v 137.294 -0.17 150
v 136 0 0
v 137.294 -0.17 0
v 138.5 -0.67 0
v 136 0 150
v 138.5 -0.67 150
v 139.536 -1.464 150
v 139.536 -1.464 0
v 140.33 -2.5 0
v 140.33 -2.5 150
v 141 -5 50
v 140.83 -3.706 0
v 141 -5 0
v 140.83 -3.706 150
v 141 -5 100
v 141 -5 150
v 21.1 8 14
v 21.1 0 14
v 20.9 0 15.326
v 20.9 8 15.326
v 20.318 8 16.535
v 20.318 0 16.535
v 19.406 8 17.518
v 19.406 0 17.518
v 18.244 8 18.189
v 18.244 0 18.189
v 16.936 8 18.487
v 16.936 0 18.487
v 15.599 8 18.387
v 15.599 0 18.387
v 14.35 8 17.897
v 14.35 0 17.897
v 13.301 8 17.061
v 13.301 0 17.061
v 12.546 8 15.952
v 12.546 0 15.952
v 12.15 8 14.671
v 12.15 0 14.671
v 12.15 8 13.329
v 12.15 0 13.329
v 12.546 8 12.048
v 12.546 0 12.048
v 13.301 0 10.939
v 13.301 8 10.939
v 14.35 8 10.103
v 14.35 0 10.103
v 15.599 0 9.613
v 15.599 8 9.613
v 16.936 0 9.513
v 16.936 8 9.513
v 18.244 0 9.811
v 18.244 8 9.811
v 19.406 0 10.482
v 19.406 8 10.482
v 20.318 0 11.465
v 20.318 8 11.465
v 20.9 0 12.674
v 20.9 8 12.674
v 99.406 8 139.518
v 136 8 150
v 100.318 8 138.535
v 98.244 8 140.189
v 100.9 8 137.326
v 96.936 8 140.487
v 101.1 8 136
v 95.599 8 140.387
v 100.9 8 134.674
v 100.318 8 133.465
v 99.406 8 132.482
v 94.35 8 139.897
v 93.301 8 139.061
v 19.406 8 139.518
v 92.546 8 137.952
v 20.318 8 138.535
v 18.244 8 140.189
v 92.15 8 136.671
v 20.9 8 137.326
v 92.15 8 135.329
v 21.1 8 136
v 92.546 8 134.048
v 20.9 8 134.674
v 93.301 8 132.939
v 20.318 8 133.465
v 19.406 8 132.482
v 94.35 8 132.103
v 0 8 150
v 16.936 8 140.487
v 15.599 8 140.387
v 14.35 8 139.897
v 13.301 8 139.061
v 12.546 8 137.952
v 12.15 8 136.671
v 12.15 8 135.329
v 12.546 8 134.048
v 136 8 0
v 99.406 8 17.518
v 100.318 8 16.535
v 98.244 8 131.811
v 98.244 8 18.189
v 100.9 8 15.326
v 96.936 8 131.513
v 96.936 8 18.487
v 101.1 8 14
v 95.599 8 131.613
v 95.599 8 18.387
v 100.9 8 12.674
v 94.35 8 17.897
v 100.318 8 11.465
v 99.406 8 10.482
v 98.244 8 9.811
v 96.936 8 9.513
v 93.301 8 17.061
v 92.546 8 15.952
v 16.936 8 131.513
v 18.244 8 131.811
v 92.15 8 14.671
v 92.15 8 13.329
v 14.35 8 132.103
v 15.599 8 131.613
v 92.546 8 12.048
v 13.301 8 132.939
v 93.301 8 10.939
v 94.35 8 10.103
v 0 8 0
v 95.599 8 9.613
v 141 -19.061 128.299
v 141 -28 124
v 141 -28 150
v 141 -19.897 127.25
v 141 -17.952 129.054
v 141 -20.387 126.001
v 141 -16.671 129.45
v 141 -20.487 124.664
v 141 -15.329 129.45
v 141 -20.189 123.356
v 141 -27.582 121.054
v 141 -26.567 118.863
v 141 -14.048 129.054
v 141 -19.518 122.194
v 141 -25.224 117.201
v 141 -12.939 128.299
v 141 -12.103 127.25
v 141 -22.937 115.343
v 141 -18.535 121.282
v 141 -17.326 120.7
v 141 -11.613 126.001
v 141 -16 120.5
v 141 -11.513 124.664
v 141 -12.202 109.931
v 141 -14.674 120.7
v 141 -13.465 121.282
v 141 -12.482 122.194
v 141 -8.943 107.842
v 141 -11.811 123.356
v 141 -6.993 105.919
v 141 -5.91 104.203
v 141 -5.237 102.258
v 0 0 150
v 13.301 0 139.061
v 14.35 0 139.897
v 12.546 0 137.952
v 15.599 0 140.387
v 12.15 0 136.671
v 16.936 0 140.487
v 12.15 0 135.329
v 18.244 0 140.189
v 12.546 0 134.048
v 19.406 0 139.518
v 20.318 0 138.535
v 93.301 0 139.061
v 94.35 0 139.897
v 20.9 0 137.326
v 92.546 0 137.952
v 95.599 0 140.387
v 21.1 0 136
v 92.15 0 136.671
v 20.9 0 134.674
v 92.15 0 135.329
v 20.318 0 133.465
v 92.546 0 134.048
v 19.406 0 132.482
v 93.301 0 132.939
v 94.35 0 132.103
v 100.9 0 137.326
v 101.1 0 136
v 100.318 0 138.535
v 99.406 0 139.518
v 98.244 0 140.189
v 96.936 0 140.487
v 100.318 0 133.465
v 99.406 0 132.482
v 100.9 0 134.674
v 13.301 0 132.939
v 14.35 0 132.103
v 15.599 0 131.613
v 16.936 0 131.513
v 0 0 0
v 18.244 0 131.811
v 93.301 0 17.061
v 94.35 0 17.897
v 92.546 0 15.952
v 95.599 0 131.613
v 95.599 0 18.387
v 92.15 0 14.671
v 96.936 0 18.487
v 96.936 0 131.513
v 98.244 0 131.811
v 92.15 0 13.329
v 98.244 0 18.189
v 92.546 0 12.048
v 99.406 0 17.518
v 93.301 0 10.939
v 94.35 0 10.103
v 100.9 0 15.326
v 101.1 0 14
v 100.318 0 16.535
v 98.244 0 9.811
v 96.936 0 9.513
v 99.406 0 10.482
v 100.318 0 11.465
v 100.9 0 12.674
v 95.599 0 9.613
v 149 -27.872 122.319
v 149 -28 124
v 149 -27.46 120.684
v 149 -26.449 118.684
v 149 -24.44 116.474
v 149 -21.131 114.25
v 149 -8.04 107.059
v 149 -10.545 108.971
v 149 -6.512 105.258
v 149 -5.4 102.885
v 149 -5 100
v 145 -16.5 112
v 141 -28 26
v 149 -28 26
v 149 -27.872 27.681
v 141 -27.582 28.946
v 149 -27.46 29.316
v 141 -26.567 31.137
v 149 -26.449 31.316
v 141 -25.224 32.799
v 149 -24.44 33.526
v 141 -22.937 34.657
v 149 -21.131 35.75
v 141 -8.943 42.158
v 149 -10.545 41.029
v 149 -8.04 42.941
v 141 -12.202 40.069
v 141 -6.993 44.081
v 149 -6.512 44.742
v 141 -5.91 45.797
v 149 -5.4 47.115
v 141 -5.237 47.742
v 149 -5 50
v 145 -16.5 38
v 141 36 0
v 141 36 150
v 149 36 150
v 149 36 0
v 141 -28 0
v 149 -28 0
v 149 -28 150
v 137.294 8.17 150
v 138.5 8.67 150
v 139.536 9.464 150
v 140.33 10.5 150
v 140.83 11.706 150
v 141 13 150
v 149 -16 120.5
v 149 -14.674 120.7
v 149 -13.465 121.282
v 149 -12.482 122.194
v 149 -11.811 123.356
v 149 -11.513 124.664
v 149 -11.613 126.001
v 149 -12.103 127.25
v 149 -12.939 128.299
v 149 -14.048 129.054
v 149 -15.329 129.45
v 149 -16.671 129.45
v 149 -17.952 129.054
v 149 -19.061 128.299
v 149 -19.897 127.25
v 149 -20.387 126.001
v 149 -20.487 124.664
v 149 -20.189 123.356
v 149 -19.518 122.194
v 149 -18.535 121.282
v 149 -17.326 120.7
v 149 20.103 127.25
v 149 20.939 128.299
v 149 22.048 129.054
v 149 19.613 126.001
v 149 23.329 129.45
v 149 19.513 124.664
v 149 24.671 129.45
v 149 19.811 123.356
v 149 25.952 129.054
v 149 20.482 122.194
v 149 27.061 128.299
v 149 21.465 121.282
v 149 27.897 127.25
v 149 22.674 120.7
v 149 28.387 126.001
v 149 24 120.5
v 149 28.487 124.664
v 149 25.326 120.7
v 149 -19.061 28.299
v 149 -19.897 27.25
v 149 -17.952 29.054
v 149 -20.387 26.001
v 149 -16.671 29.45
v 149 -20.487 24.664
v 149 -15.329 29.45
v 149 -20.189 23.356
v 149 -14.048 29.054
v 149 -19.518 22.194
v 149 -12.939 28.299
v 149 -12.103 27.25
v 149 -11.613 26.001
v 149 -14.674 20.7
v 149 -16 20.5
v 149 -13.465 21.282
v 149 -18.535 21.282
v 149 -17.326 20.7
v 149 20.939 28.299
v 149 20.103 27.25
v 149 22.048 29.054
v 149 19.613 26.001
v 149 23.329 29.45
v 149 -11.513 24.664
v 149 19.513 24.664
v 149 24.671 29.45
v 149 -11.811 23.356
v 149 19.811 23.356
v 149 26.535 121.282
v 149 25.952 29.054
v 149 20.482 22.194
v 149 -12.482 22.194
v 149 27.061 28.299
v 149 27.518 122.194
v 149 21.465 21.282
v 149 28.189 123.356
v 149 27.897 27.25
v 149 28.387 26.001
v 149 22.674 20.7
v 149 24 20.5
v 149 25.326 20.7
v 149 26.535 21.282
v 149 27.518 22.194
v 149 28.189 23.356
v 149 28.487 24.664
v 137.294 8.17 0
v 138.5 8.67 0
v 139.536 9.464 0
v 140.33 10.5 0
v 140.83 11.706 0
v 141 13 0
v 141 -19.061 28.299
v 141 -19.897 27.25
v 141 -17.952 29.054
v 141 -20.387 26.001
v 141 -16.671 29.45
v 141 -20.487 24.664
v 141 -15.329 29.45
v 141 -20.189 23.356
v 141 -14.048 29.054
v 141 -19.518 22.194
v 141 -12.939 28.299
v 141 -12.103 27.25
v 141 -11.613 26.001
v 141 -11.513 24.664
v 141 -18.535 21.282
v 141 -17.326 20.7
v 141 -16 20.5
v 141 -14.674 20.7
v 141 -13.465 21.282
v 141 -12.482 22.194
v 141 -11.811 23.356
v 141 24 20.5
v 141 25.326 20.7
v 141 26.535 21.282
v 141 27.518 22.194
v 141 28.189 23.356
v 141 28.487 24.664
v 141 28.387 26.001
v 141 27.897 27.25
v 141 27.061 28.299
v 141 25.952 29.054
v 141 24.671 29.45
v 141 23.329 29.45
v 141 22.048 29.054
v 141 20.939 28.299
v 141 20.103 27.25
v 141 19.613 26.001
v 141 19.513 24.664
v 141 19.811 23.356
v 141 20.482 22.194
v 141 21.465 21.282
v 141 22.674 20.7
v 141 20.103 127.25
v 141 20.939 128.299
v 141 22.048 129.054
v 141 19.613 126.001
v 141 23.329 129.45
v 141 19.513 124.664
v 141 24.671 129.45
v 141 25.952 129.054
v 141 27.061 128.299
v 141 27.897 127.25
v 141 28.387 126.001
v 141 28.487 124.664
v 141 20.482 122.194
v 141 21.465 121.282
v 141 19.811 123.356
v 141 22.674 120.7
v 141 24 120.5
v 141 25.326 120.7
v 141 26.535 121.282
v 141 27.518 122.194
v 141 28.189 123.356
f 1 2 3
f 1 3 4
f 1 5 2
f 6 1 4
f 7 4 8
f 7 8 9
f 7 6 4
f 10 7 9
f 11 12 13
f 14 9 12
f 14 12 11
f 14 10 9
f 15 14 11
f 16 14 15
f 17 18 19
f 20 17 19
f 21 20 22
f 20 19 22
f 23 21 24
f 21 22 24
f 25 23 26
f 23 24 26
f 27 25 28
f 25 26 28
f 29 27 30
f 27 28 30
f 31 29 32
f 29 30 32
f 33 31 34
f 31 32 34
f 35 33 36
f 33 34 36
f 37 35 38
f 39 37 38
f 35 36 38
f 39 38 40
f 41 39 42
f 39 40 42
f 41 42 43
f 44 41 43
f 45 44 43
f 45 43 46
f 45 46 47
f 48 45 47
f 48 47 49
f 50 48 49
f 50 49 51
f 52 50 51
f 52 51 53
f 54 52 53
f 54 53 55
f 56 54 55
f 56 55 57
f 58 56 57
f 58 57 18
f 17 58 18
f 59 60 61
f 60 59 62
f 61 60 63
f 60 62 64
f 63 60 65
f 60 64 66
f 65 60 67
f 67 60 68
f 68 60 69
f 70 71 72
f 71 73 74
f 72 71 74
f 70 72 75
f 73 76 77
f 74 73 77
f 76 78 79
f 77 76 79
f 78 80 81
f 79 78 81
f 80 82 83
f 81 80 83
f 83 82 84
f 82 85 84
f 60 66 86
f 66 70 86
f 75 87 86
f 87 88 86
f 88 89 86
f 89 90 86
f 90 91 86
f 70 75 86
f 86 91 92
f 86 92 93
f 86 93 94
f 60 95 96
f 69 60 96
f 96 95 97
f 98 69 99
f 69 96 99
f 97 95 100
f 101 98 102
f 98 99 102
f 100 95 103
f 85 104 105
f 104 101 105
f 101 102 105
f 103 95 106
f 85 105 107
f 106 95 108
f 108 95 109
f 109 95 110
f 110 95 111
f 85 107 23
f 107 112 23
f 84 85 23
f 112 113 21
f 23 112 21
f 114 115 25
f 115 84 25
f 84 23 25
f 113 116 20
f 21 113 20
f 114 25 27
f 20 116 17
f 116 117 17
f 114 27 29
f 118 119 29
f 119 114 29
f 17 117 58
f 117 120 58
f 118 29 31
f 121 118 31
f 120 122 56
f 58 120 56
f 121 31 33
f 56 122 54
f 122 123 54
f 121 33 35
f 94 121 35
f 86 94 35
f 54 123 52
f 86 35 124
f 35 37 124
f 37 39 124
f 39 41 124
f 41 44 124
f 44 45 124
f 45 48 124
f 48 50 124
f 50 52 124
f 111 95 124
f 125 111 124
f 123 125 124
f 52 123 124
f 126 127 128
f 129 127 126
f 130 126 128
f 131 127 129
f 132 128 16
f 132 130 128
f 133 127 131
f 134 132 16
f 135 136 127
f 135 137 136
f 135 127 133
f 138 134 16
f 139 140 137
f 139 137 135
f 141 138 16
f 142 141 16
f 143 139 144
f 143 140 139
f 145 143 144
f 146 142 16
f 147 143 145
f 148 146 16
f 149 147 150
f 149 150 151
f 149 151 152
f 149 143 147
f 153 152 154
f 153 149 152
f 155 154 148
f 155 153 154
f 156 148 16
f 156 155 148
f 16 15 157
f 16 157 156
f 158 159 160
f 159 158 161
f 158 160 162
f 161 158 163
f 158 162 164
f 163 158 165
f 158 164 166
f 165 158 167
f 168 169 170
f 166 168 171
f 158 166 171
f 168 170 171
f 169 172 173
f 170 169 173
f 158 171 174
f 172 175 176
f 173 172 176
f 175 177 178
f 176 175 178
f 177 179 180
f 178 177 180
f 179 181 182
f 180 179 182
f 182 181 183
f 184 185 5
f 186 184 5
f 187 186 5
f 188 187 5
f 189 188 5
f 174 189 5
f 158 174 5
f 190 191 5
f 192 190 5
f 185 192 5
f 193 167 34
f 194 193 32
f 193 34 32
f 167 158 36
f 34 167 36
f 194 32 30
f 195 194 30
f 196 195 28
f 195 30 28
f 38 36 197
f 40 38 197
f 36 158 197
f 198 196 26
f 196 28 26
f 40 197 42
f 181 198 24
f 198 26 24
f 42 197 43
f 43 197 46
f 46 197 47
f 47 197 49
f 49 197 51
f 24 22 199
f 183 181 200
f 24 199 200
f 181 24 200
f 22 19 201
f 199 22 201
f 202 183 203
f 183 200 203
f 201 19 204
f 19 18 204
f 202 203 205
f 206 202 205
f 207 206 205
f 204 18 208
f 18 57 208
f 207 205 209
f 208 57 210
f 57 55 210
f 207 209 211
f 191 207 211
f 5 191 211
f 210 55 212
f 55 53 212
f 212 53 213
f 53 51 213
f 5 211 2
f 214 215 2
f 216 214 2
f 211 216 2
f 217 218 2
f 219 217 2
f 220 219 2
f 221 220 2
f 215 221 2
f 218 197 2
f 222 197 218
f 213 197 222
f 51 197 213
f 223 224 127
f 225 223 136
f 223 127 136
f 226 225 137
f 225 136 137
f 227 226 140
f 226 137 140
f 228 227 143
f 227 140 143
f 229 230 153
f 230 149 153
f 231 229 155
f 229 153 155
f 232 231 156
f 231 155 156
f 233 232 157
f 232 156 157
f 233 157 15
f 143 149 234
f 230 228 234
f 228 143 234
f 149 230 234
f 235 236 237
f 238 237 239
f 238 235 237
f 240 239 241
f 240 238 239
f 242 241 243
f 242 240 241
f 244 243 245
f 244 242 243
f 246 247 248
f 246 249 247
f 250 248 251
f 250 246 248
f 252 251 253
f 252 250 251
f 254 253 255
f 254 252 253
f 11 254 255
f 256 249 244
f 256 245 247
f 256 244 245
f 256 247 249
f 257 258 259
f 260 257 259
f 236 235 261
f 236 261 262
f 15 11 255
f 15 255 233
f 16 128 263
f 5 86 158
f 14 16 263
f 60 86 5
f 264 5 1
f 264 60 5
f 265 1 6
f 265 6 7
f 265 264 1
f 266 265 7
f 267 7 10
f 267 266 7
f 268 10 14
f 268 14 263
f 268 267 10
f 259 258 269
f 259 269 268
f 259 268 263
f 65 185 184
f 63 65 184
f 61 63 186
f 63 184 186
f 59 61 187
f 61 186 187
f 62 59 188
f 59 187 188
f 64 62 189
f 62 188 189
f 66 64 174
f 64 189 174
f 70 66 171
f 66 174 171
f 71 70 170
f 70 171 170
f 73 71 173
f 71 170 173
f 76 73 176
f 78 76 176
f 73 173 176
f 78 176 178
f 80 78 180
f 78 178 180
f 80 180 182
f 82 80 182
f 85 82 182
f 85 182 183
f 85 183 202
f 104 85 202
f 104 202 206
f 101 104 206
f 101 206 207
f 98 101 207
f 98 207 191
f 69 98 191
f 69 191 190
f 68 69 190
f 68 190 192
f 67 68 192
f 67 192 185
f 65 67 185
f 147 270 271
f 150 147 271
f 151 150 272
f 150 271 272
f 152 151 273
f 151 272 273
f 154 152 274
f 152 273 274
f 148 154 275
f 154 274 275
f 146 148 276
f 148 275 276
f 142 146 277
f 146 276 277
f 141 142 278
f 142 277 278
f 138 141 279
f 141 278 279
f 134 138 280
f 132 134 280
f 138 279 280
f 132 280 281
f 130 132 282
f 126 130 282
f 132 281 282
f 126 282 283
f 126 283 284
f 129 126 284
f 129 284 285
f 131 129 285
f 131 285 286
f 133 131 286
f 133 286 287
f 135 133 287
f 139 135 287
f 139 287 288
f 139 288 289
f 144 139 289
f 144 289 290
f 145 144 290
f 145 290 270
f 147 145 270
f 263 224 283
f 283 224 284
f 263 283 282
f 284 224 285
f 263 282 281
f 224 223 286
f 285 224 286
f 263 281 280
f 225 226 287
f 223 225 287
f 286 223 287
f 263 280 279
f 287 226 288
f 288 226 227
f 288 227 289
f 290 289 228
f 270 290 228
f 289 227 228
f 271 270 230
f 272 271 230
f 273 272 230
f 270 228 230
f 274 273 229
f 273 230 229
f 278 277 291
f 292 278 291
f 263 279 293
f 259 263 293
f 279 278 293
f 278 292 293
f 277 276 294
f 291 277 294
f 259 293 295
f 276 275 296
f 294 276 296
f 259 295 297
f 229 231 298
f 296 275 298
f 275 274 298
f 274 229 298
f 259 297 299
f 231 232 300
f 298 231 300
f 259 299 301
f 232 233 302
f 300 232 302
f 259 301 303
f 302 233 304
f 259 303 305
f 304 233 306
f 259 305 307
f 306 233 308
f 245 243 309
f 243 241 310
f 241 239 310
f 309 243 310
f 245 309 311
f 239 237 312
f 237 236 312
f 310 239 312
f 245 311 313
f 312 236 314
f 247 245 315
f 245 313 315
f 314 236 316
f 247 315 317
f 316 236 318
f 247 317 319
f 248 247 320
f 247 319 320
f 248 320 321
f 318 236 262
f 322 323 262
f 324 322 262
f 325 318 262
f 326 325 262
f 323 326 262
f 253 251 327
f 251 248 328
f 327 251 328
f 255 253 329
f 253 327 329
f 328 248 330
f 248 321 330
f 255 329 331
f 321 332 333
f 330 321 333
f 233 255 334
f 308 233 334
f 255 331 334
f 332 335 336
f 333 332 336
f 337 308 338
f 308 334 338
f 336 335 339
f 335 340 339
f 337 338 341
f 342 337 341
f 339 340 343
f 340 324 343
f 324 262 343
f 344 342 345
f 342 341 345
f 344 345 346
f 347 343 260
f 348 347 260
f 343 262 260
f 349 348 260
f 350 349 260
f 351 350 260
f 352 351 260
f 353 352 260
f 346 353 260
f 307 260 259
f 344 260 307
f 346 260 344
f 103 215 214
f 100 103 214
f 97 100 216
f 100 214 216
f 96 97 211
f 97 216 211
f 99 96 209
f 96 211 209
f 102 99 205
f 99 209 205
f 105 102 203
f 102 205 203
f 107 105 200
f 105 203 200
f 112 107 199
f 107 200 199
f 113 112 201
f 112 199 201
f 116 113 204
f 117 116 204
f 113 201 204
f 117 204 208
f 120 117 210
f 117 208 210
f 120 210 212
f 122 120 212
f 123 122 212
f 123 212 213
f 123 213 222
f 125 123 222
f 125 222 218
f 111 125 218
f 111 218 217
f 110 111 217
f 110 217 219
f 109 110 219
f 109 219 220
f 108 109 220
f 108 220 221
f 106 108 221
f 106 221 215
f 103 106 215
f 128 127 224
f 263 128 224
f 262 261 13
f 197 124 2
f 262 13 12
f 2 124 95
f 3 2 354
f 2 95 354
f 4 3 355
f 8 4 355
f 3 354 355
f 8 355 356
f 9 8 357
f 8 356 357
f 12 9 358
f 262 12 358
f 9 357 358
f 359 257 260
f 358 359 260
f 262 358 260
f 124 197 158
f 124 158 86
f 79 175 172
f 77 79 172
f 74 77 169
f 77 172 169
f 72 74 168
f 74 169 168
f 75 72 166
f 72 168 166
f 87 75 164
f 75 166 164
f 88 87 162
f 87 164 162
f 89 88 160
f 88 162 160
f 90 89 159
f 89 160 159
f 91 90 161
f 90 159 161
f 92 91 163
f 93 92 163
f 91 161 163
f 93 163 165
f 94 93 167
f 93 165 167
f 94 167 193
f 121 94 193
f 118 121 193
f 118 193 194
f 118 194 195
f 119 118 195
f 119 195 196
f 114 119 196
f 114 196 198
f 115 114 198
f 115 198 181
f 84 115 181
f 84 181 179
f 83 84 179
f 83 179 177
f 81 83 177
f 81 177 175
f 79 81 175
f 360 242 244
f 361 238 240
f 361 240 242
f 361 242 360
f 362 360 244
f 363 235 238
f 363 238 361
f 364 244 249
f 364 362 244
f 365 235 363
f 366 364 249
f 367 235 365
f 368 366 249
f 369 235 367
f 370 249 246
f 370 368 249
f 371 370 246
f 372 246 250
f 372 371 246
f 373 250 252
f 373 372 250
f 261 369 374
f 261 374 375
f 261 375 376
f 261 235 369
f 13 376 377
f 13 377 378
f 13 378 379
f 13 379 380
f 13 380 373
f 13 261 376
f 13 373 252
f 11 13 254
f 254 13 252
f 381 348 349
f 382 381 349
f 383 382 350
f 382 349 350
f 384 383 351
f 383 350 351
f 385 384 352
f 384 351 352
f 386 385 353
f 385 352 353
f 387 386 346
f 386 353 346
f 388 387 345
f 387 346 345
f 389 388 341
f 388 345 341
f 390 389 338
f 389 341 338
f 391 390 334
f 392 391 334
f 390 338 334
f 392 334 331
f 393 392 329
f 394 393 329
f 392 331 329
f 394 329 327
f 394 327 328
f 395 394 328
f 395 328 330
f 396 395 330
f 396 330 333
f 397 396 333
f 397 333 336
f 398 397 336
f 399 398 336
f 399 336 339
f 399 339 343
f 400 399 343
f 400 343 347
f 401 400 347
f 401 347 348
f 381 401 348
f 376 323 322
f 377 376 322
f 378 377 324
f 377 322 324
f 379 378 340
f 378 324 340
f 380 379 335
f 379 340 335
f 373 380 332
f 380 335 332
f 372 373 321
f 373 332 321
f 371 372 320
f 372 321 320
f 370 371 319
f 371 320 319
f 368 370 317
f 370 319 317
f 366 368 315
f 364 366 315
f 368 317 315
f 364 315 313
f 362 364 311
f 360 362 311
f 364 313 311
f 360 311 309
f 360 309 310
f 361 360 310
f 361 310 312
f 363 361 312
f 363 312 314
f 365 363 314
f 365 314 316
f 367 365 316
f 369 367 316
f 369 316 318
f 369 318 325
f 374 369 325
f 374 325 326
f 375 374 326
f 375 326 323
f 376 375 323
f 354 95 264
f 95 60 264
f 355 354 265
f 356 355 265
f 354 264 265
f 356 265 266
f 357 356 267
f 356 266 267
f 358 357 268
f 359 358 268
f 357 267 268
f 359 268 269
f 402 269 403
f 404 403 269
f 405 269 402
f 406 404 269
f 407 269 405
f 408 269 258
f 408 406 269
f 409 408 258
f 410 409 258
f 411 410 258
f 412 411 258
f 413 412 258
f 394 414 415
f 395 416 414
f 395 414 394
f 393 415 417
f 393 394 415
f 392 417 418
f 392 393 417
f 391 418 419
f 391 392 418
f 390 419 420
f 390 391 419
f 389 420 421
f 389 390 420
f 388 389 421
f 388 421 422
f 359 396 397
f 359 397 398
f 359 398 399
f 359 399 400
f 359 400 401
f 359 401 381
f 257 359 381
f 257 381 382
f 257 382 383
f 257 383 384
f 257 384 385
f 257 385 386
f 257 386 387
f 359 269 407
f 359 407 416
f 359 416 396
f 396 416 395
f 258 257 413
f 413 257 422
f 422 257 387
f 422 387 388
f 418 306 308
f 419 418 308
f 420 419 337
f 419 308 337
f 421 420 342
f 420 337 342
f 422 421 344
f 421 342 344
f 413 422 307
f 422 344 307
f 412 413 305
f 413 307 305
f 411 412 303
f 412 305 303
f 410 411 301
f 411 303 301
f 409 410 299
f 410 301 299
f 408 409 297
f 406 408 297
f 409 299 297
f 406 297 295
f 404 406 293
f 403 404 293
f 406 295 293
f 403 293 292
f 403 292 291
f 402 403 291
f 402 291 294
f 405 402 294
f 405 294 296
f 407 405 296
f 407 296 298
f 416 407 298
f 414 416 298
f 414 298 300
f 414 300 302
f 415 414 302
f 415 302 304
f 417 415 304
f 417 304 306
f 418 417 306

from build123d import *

# Parameters (mm, degrees)
SKETCH2_W           = 141
SKETCH2_H           = 8
SKETCH2_W_2         = 8
SKETCH2_H_2         = 28
BOSS_EXTRUDE1_DEPTH = 150
CUT_EXTRUDE1_REACH  = 38
SKETCH3_R           = 4.5
CUT_EXTRUDE2_REACH  = 151
SKETCH5_R           = 4.5
FILLET1_R           = 5
CUT_EXTRUDE3_REACH  = 10


with BuildPart() as part:
    # Sketch2 → Boss-Extrude1 (new body)
    with BuildSketch(Plane.XY):
        with Locations((70.5, 4)):
            Rectangle(SKETCH2_W, SKETCH2_H)
        with Locations((145, 4)):
            Rectangle(SKETCH2_W_2, SKETCH2_H)
        with Locations((145, 22)):
            Rectangle(SKETCH2_W_2, SKETCH2_H_2)
        with Locations((145, -14)):
            Rectangle(SKETCH2_W_2, SKETCH2_H_2)
    extrude(amount=BOSS_EXTRUDE1_DEPTH)

    # Sketch3 → Cut-Extrude1 (cut, up to next)
    with BuildSketch(Plane.XZ, mode=Mode.PRIVATE) as cut_extrude1_sk1:
        with Locations((96.6, 136)):
            Circle(SKETCH3_R)
    cut_extrude1_tool1 = extrude(cut_extrude1_sk1.sketch, amount=-CUT_EXTRUDE1_REACH, mode=Mode.PRIVATE) & part.part
    add(cut_extrude1_tool1.solids().sort_by_distance((96.6, 0, 136))[0], mode=Mode.SUBTRACT)
    # Sketch3 → Cut-Extrude1 (cut, up to next)
    with BuildSketch(Plane.XZ, mode=Mode.PRIVATE) as cut_extrude1_sk2:
        with Locations((16.6, 136)):
            Circle(SKETCH3_R)
    cut_extrude1_tool2 = extrude(cut_extrude1_sk2.sketch, amount=-CUT_EXTRUDE1_REACH, mode=Mode.PRIVATE) & part.part
    add(cut_extrude1_tool2.solids().sort_by_distance((16.6, 0, 136))[0], mode=Mode.SUBTRACT)
    # Sketch3 → Cut-Extrude1 (cut, up to next)
    with BuildSketch(Plane.XZ, mode=Mode.PRIVATE) as cut_extrude1_sk3:
        with Locations((16.6, 14)):
            Circle(SKETCH3_R)
    cut_extrude1_tool3 = extrude(cut_extrude1_sk3.sketch, amount=-CUT_EXTRUDE1_REACH, mode=Mode.PRIVATE) & part.part
    add(cut_extrude1_tool3.solids().sort_by_distance((16.6, 0, 14))[0], mode=Mode.SUBTRACT)
    # Sketch3 → Cut-Extrude1 (cut, up to next)
    with BuildSketch(Plane.XZ, mode=Mode.PRIVATE) as cut_extrude1_sk4:
        with Locations((96.6, 14)):
            Circle(SKETCH3_R)
    cut_extrude1_tool4 = extrude(cut_extrude1_sk4.sketch, amount=-CUT_EXTRUDE1_REACH, mode=Mode.PRIVATE) & part.part
    add(cut_extrude1_tool4.solids().sort_by_distance((96.6, 0, 14))[0], mode=Mode.SUBTRACT)

    # Sketch5 → Cut-Extrude2 (cut, up to next)
    with BuildSketch(Plane(origin=(149, 0, 0), x_dir=(0, 0, -1), z_dir=(1, 0, 0)), mode=Mode.PRIVATE) as cut_extrude2_sk1:
        with Locations((-125, 24)):
            Circle(SKETCH5_R)
    cut_extrude2_tool1 = extrude(cut_extrude2_sk1.sketch, amount=-CUT_EXTRUDE2_REACH, mode=Mode.PRIVATE) & part.part
    add(cut_extrude2_tool1.solids().sort_by_distance((149, 24, 125))[0], mode=Mode.SUBTRACT)
    # Sketch5 → Cut-Extrude2 (cut, up to next)
    with BuildSketch(Plane(origin=(149, 0, 0), x_dir=(0, 0, -1), z_dir=(1, 0, 0)), mode=Mode.PRIVATE) as cut_extrude2_sk2:
        with Locations((-25, 24)):
            Circle(SKETCH5_R)
    cut_extrude2_tool2 = extrude(cut_extrude2_sk2.sketch, amount=-CUT_EXTRUDE2_REACH, mode=Mode.PRIVATE) & part.part
    add(cut_extrude2_tool2.solids().sort_by_distance((149, 24, 25))[0], mode=Mode.SUBTRACT)
    # Sketch5 → Cut-Extrude2 (cut, up to next)
    with BuildSketch(Plane(origin=(149, 0, 0), x_dir=(0, 0, -1), z_dir=(1, 0, 0)), mode=Mode.PRIVATE) as cut_extrude2_sk3:
        with Locations((-25, -16)):
            Circle(SKETCH5_R)
    cut_extrude2_tool3 = extrude(cut_extrude2_sk3.sketch, amount=-CUT_EXTRUDE2_REACH, mode=Mode.PRIVATE) & part.part
    add(cut_extrude2_tool3.solids().sort_by_distance((149, -16, 25))[0], mode=Mode.SUBTRACT)
    # Sketch5 → Cut-Extrude2 (cut, up to next)
    with BuildSketch(Plane(origin=(149, 0, 0), x_dir=(0, 0, -1), z_dir=(1, 0, 0)), mode=Mode.PRIVATE) as cut_extrude2_sk4:
        with Locations((-125, -16)):
            Circle(SKETCH5_R)
    cut_extrude2_tool4 = extrude(cut_extrude2_sk4.sketch, amount=-CUT_EXTRUDE2_REACH, mode=Mode.PRIVATE) & part.part
    add(cut_extrude2_tool4.solids().sort_by_distance((149, -16, 125))[0], mode=Mode.SUBTRACT)

    # Fillet1
    fillet1_edges = [part.edges().sort_by_distance(p)[0] for p in [
        (141, 8, 75),
        (141, 0, 75),
    ]]
    fillet(fillet1_edges, radius=FILLET1_R)

    # Sketch6 → Cut-Extrude3 (cut, up to next)
    with BuildSketch(Plane.ZY.offset(-141), mode=Mode.PRIVATE) as cut_extrude3_sk1:
        with BuildLine():
            Line((50, -5), (100, -5))
            add(Edge.make_bspline(
                [(124, -28), (117.235743552, -28), (112, -16.5), (106.764256448, -5), (100, -5)],
                knots=[0, 0, 0, 0, 0.5, 1, 1, 1, 1], degree=3))
            Line((124, -28), (26, -28))
            add(Edge.make_bspline(
                [(26, -28), (32.764256448, -28), (38, -16.5), (43.235743552, -5), (50, -5)],
                knots=[0, 0, 0, 0, 0.5, 1, 1, 1, 1], degree=3))
        make_face()
    cut_extrude3_tool1 = extrude(cut_extrude3_sk1.sketch, amount=-CUT_EXTRUDE3_REACH, mode=Mode.PRIVATE) & part.part
    add(cut_extrude3_tool1.solids().sort_by_distance((141, -17.262694, 75))[0], mode=Mode.SUBTRACT)


solid = part.part
